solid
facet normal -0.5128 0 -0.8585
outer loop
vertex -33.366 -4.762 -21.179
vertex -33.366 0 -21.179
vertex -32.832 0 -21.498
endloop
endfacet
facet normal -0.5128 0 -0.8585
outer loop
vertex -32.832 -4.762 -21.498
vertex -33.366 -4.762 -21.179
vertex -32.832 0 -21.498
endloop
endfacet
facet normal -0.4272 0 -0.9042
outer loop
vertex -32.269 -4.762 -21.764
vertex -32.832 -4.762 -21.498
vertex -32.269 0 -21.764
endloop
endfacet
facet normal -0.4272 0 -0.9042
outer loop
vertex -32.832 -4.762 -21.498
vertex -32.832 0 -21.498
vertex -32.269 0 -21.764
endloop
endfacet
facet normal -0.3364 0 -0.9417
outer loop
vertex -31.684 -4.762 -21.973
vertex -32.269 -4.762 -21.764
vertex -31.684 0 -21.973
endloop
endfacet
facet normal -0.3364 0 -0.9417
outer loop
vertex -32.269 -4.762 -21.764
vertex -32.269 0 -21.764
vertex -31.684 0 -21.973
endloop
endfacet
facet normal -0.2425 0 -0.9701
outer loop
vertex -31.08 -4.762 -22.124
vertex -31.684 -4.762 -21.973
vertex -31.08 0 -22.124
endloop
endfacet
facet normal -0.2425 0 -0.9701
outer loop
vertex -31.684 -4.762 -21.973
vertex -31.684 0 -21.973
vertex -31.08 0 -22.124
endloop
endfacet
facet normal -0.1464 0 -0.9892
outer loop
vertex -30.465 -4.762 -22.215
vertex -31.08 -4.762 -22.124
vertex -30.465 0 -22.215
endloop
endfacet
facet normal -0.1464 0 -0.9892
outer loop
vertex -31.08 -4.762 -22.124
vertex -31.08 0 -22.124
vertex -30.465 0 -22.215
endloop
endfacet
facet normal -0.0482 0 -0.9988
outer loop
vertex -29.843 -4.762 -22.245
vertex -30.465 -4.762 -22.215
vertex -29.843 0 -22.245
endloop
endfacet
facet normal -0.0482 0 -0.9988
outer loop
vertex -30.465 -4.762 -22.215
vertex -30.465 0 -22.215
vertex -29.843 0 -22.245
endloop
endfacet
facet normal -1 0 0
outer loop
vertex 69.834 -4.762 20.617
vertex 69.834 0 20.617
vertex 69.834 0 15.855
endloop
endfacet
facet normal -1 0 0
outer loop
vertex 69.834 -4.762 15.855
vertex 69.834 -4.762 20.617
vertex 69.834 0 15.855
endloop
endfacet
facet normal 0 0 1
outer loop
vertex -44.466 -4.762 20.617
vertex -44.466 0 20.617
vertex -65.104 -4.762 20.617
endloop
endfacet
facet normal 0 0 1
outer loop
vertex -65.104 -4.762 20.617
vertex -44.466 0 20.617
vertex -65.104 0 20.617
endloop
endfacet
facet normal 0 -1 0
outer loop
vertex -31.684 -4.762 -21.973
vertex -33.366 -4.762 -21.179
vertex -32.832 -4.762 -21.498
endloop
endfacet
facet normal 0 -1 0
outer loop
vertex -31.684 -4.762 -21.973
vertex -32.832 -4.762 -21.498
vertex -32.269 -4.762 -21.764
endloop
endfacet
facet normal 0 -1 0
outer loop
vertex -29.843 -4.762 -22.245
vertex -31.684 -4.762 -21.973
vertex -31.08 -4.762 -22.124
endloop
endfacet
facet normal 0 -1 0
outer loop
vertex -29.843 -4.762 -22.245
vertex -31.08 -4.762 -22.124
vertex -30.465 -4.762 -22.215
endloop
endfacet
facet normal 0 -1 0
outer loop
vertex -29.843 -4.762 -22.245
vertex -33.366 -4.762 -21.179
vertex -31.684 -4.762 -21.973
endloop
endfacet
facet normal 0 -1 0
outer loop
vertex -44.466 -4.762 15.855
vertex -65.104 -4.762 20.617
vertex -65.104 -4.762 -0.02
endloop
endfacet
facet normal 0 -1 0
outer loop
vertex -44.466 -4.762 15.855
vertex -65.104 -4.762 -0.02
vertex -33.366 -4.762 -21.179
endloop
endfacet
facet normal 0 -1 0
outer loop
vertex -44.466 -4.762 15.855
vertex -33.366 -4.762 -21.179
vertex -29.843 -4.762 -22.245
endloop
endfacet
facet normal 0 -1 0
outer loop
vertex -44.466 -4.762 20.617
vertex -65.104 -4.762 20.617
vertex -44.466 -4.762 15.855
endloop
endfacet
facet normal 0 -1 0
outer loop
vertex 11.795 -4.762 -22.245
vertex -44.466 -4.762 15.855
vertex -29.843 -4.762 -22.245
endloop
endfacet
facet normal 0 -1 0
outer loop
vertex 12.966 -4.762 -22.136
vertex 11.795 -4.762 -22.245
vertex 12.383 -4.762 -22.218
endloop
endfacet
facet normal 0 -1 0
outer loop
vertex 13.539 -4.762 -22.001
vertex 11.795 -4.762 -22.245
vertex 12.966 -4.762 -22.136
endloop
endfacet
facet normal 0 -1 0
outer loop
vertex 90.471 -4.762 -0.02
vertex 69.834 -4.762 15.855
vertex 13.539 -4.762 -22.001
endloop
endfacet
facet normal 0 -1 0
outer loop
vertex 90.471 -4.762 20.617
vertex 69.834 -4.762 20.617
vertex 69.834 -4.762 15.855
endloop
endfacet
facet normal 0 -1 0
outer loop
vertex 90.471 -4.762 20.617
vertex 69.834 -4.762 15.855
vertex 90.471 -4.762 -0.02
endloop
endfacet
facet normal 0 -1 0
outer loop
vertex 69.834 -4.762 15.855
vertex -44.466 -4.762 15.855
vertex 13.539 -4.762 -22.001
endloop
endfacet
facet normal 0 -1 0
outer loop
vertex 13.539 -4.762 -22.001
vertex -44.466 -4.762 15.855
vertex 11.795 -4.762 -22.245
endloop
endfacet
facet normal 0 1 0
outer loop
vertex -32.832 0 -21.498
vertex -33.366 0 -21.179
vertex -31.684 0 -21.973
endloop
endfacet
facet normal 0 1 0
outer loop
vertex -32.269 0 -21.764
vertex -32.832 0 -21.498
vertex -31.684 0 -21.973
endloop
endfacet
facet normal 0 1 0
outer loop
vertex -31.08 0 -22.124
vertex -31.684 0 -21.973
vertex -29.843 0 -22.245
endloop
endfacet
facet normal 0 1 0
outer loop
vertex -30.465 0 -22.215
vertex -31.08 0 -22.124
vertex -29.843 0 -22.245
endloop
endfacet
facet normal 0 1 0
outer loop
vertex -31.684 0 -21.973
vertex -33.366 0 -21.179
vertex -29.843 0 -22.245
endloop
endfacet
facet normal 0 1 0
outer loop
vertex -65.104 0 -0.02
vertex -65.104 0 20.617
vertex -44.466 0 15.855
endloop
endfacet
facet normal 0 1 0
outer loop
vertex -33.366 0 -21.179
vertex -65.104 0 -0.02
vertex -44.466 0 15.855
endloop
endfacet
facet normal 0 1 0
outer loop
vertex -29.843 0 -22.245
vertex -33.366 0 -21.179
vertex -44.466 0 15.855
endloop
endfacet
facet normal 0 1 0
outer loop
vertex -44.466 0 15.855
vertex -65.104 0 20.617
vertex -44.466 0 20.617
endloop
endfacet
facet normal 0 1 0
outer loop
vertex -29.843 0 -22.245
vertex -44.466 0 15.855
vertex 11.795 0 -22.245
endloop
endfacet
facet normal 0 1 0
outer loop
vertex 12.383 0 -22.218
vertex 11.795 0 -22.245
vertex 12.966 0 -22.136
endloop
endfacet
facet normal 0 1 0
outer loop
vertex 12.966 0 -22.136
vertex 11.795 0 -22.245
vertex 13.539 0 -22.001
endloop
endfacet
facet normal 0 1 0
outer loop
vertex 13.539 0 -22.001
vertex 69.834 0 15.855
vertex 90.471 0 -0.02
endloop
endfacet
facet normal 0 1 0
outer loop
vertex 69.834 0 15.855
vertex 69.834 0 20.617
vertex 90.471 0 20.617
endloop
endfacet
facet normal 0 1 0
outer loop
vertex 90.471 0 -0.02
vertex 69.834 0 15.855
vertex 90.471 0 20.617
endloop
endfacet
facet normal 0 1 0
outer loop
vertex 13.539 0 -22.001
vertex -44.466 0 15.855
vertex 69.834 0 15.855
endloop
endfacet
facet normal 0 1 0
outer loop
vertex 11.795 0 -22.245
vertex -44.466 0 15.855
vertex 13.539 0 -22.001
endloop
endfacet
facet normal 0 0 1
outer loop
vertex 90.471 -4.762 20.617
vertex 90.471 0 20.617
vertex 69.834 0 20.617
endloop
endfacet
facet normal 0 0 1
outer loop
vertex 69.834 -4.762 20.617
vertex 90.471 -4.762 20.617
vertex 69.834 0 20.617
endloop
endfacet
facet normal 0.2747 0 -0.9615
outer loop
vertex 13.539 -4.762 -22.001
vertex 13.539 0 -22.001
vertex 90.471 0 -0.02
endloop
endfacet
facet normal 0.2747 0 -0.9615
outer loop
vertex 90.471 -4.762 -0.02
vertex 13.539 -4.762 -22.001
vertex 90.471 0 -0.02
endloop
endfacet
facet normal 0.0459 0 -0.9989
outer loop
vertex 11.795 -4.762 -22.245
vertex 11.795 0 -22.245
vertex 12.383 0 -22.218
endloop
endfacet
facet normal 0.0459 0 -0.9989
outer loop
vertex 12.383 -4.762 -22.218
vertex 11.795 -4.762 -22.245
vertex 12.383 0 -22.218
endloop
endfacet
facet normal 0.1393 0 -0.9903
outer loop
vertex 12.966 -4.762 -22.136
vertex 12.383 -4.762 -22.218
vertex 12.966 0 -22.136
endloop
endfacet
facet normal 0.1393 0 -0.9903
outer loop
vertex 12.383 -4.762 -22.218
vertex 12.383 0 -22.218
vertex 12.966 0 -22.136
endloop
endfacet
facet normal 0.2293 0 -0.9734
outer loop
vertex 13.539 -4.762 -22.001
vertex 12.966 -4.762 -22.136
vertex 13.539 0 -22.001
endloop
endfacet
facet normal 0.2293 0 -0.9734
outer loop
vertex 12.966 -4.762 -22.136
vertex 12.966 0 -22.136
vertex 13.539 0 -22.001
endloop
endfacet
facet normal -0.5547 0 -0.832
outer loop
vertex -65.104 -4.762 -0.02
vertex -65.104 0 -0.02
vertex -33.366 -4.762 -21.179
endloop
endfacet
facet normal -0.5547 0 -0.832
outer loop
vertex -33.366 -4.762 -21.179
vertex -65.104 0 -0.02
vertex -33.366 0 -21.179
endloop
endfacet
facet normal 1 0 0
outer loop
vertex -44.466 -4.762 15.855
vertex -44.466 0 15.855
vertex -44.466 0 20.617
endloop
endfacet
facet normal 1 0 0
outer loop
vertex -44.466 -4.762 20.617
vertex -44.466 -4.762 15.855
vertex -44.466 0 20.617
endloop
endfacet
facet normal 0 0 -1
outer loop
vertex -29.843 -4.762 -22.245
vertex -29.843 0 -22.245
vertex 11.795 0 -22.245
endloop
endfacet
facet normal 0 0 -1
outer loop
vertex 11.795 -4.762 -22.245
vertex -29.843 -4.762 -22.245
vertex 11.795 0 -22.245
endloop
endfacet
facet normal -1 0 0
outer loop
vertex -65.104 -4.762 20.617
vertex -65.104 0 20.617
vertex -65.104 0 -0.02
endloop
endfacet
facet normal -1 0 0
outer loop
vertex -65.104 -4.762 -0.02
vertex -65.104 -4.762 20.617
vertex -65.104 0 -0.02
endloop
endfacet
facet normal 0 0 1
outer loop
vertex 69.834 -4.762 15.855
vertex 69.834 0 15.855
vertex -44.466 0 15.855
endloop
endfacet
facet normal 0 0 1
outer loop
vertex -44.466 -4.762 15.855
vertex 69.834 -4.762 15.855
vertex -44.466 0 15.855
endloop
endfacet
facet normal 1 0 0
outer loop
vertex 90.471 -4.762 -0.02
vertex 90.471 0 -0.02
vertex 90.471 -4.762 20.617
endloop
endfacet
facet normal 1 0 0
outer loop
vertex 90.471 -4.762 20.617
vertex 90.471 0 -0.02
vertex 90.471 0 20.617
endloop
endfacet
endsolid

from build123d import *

# Parameters (mm, degrees)
F1_DEPTH = 4.7625


with BuildPart() as f1:
    # F0 (on Front) → F1 (new body)
    with BuildSketch(Plane.XZ):
        with BuildLine():
            Line((-44.46612, 20.617304), (-65.10362, 20.617304))
            Line((-65.10362, 20.617304), (-65.10362, -0.020196))
            Line((-65.10362, -0.020196), (-33.365841, -21.178716))
            ThreePointArc((-33.365841, -21.178716), (-31.683624, -21.972731), (-29.843495, -22.245196))
            Line((-29.843495, -22.245196), (11.794531, -22.245196))
            ThreePointArc((11.794531, -22.245196), (12.675284, -22.183819), (13.53901, -22.000873))
            Line((13.53901, -22.000873), (90.47138, -0.020196))
            Line((90.47138, -0.020196), (90.47138, 20.617304))
            Line((90.47138, 20.617304), (69.83388, 20.617304))
            Line((69.83388, 20.617304), (69.83388, 15.854804))
            Line((69.83388, 15.854804), (-44.46612, 15.854804))
            Line((-44.46612, 15.854804), (-44.46612, 20.617304))
        make_face()
    extrude(amount=F1_DEPTH)


solid = f1.part
